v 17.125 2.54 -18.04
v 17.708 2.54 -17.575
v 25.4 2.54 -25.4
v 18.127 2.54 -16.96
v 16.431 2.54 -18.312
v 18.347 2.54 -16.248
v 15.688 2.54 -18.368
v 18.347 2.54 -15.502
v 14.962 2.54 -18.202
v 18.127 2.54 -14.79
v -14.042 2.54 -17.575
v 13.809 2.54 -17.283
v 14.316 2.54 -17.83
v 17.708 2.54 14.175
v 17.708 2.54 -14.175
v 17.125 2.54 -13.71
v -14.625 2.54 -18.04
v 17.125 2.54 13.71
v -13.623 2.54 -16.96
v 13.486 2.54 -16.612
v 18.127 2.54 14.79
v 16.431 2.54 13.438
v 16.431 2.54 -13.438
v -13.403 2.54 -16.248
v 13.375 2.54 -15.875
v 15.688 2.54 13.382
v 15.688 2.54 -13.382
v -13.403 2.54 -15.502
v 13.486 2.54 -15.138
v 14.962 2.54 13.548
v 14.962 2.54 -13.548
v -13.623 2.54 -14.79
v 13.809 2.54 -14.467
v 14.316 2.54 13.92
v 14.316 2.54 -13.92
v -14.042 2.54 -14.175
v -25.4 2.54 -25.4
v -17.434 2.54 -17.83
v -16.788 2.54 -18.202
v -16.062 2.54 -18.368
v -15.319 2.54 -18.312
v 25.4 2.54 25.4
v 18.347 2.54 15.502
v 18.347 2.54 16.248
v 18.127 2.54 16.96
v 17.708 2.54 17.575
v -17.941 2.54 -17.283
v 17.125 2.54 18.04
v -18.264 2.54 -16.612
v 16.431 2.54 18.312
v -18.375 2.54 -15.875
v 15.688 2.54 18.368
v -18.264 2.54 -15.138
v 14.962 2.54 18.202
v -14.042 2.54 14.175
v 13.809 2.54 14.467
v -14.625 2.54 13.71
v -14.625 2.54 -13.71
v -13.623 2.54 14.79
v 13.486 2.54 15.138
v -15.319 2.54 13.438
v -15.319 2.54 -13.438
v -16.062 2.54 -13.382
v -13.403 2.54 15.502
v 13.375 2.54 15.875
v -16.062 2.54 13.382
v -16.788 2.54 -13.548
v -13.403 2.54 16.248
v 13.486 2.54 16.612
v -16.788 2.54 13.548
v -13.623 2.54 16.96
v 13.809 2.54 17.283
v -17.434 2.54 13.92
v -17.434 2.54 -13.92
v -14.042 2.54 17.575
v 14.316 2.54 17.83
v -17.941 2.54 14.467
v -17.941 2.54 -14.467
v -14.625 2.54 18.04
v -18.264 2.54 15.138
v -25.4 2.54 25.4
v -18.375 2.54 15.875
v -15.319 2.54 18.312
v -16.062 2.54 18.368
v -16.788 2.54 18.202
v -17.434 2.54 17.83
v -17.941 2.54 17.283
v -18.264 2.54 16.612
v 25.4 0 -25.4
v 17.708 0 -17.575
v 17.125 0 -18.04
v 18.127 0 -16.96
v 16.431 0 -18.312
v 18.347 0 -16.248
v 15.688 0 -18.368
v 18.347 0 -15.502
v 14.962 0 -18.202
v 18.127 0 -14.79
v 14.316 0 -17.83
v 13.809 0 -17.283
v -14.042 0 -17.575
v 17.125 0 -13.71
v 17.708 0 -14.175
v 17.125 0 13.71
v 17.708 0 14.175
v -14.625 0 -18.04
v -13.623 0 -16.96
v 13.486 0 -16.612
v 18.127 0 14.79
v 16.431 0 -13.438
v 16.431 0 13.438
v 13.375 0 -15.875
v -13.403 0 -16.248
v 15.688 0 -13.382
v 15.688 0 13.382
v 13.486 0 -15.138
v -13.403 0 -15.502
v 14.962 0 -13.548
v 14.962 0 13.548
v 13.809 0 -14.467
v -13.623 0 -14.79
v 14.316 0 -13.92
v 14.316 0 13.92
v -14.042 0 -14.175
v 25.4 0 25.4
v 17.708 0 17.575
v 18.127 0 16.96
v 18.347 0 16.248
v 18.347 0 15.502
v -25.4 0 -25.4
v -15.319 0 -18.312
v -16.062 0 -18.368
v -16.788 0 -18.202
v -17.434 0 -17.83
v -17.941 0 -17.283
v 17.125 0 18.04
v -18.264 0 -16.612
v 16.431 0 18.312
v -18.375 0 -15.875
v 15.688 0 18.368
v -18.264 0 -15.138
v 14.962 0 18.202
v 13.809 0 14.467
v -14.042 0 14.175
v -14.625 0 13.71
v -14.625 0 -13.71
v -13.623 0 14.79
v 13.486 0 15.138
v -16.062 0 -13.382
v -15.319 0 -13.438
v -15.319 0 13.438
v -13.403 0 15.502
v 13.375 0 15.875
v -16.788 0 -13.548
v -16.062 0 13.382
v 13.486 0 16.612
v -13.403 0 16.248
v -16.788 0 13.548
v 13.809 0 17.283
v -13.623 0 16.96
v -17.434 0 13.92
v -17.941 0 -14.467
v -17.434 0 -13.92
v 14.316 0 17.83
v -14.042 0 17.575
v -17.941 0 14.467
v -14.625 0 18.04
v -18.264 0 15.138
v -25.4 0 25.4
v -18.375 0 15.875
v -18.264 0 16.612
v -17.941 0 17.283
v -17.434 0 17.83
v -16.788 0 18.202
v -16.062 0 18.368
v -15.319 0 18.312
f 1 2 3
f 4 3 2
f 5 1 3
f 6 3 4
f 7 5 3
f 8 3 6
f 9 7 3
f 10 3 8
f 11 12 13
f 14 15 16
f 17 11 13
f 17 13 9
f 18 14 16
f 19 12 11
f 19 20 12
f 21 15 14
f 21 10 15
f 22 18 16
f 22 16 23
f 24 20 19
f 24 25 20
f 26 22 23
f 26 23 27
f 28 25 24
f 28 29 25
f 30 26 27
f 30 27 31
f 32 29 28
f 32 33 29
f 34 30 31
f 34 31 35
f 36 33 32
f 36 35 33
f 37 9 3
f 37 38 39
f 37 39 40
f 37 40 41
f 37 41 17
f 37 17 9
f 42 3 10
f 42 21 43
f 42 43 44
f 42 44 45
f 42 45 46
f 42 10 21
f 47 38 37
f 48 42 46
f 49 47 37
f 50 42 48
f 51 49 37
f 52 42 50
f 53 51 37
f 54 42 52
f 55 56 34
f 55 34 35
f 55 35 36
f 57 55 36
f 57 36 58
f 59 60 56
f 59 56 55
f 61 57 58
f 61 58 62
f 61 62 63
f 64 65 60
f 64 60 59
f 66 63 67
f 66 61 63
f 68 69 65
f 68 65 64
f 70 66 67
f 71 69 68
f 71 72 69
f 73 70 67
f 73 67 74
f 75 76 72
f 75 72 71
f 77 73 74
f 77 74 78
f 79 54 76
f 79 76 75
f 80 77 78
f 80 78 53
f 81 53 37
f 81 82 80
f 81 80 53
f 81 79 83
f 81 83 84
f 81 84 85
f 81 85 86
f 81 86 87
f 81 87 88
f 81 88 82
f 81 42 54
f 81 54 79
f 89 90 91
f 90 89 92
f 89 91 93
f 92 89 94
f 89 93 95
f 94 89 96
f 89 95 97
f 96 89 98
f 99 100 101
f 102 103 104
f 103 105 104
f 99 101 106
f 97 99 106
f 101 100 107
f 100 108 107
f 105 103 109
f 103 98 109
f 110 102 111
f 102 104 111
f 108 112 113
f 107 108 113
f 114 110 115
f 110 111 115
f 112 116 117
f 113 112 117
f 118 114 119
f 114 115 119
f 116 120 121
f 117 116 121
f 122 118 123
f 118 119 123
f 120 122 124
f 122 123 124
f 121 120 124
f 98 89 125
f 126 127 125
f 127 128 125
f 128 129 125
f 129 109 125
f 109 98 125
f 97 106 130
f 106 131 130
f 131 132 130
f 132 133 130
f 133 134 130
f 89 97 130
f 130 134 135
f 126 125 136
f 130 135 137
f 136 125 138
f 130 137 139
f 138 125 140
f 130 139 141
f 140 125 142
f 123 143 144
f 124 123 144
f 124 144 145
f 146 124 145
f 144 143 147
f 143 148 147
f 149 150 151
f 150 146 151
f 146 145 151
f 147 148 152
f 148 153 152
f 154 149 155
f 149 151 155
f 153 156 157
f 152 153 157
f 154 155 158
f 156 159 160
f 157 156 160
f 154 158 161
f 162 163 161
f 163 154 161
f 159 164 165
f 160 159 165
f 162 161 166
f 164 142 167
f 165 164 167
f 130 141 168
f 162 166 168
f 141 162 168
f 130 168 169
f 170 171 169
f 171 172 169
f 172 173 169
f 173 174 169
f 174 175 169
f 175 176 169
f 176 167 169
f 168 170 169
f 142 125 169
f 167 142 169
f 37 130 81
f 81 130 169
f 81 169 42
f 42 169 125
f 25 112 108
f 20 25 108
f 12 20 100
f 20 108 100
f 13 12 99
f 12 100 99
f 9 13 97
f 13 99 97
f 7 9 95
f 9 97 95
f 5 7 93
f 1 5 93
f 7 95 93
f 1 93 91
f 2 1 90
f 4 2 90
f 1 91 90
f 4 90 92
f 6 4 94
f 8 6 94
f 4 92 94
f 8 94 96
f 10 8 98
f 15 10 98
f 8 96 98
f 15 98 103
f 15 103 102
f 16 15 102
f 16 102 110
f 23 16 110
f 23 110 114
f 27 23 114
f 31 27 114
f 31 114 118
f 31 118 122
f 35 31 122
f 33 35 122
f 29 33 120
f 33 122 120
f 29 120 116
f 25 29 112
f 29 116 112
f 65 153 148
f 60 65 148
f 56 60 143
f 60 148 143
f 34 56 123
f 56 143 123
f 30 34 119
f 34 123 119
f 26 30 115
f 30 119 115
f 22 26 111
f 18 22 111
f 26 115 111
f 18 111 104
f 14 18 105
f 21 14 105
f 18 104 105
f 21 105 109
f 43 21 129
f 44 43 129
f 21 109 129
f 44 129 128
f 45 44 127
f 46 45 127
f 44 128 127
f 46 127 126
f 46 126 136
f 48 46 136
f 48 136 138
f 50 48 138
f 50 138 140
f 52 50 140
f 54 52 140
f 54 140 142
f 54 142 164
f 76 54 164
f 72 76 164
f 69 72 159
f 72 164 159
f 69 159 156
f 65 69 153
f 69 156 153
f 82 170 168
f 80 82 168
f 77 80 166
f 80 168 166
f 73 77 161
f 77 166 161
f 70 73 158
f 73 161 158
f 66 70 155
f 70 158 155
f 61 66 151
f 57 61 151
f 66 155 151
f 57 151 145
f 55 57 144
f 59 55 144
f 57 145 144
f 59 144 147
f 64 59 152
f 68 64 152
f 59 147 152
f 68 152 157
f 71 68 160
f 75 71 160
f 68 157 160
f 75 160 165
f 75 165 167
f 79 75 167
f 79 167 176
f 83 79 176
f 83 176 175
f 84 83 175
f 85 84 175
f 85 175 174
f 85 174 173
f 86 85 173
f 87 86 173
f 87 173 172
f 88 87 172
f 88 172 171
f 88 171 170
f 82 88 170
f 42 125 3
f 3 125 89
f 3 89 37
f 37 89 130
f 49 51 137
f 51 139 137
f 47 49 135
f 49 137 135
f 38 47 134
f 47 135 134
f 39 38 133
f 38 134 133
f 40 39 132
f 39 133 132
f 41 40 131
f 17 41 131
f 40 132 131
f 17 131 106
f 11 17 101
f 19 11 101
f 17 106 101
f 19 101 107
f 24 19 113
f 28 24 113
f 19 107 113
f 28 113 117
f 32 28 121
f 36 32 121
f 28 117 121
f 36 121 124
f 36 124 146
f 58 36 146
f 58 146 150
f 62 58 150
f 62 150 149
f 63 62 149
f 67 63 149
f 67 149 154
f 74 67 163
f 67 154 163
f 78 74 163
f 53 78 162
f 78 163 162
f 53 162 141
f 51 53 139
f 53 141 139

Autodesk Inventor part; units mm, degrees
ref_plane "YZ Plane" through (0, 0, 0) normal (1, 0, 0) x (0, 1, 0)
ref_plane "XZ Plane" through (0, 0, 0) normal (0, 1, 0) x (-1, 0, 0)
ref_plane "XY Plane" through (0, 0, 0) normal (0, 0, 1) x (1, 0, 0)
sketch "Sketch1" plane through (0, 0, 0) normal (0, 1, 0) x (-1, 0, 0)
  line L0 (-25.4, -25.4) -> (25.4, -25.4)
  line L1 (25.4, -25.4) -> (25.4, 25.4)
  line L2 (25.4, 25.4) -> (-25.4, 25.4)
  line L3 (-25.4, 25.4) -> (-25.4, -25.4)
  line L4 (-25.4, -25.4) -> (25.4, 25.4) construction
  line L5 (25.4, -25.4) -> (-25.4, 25.4) construction
  line L6 (-15.875, 15.875) -> (15.875, 15.875)
  line L7 (15.875, 15.875) -> (15.875, -15.875)
  line L8 (15.875, -15.875) -> (-15.875, -15.875)
  line L9 (-15.875, -15.875) -> (-15.875, 15.875)
  line L10 (-15.875, 15.875) -> (15.875, -15.875) construction
  line L11 (15.875, 15.875) -> (-15.875, -15.875) construction
  circle A0 centre (15.875, 15.875) radius 2.5
  circle A1 centre (15.875, -15.875) radius 2.5
  circle A2 centre (-15.875, -15.875) radius 2.5
  circle A3 centre (-15.875, 15.875) radius 2.5
  point P0 (0, 0)
  dimension "d0" = 50.8
  dimension "d1" = 50.8
  dimension "d2" = 31.75
  dimension "d3" = 31.75
  dimension "d4" = 5
  dimension "d5" = 5
  dimension "d6" = 5
  dimension "d7" = 5
extrude "Extrusion1" add sketch "Sketch1" along normal blind 2.54 contours L3 L2 L1 L0 | L6 A0 L7 A1 L8 A2 L9 A3
properties part number "l channel guide"
